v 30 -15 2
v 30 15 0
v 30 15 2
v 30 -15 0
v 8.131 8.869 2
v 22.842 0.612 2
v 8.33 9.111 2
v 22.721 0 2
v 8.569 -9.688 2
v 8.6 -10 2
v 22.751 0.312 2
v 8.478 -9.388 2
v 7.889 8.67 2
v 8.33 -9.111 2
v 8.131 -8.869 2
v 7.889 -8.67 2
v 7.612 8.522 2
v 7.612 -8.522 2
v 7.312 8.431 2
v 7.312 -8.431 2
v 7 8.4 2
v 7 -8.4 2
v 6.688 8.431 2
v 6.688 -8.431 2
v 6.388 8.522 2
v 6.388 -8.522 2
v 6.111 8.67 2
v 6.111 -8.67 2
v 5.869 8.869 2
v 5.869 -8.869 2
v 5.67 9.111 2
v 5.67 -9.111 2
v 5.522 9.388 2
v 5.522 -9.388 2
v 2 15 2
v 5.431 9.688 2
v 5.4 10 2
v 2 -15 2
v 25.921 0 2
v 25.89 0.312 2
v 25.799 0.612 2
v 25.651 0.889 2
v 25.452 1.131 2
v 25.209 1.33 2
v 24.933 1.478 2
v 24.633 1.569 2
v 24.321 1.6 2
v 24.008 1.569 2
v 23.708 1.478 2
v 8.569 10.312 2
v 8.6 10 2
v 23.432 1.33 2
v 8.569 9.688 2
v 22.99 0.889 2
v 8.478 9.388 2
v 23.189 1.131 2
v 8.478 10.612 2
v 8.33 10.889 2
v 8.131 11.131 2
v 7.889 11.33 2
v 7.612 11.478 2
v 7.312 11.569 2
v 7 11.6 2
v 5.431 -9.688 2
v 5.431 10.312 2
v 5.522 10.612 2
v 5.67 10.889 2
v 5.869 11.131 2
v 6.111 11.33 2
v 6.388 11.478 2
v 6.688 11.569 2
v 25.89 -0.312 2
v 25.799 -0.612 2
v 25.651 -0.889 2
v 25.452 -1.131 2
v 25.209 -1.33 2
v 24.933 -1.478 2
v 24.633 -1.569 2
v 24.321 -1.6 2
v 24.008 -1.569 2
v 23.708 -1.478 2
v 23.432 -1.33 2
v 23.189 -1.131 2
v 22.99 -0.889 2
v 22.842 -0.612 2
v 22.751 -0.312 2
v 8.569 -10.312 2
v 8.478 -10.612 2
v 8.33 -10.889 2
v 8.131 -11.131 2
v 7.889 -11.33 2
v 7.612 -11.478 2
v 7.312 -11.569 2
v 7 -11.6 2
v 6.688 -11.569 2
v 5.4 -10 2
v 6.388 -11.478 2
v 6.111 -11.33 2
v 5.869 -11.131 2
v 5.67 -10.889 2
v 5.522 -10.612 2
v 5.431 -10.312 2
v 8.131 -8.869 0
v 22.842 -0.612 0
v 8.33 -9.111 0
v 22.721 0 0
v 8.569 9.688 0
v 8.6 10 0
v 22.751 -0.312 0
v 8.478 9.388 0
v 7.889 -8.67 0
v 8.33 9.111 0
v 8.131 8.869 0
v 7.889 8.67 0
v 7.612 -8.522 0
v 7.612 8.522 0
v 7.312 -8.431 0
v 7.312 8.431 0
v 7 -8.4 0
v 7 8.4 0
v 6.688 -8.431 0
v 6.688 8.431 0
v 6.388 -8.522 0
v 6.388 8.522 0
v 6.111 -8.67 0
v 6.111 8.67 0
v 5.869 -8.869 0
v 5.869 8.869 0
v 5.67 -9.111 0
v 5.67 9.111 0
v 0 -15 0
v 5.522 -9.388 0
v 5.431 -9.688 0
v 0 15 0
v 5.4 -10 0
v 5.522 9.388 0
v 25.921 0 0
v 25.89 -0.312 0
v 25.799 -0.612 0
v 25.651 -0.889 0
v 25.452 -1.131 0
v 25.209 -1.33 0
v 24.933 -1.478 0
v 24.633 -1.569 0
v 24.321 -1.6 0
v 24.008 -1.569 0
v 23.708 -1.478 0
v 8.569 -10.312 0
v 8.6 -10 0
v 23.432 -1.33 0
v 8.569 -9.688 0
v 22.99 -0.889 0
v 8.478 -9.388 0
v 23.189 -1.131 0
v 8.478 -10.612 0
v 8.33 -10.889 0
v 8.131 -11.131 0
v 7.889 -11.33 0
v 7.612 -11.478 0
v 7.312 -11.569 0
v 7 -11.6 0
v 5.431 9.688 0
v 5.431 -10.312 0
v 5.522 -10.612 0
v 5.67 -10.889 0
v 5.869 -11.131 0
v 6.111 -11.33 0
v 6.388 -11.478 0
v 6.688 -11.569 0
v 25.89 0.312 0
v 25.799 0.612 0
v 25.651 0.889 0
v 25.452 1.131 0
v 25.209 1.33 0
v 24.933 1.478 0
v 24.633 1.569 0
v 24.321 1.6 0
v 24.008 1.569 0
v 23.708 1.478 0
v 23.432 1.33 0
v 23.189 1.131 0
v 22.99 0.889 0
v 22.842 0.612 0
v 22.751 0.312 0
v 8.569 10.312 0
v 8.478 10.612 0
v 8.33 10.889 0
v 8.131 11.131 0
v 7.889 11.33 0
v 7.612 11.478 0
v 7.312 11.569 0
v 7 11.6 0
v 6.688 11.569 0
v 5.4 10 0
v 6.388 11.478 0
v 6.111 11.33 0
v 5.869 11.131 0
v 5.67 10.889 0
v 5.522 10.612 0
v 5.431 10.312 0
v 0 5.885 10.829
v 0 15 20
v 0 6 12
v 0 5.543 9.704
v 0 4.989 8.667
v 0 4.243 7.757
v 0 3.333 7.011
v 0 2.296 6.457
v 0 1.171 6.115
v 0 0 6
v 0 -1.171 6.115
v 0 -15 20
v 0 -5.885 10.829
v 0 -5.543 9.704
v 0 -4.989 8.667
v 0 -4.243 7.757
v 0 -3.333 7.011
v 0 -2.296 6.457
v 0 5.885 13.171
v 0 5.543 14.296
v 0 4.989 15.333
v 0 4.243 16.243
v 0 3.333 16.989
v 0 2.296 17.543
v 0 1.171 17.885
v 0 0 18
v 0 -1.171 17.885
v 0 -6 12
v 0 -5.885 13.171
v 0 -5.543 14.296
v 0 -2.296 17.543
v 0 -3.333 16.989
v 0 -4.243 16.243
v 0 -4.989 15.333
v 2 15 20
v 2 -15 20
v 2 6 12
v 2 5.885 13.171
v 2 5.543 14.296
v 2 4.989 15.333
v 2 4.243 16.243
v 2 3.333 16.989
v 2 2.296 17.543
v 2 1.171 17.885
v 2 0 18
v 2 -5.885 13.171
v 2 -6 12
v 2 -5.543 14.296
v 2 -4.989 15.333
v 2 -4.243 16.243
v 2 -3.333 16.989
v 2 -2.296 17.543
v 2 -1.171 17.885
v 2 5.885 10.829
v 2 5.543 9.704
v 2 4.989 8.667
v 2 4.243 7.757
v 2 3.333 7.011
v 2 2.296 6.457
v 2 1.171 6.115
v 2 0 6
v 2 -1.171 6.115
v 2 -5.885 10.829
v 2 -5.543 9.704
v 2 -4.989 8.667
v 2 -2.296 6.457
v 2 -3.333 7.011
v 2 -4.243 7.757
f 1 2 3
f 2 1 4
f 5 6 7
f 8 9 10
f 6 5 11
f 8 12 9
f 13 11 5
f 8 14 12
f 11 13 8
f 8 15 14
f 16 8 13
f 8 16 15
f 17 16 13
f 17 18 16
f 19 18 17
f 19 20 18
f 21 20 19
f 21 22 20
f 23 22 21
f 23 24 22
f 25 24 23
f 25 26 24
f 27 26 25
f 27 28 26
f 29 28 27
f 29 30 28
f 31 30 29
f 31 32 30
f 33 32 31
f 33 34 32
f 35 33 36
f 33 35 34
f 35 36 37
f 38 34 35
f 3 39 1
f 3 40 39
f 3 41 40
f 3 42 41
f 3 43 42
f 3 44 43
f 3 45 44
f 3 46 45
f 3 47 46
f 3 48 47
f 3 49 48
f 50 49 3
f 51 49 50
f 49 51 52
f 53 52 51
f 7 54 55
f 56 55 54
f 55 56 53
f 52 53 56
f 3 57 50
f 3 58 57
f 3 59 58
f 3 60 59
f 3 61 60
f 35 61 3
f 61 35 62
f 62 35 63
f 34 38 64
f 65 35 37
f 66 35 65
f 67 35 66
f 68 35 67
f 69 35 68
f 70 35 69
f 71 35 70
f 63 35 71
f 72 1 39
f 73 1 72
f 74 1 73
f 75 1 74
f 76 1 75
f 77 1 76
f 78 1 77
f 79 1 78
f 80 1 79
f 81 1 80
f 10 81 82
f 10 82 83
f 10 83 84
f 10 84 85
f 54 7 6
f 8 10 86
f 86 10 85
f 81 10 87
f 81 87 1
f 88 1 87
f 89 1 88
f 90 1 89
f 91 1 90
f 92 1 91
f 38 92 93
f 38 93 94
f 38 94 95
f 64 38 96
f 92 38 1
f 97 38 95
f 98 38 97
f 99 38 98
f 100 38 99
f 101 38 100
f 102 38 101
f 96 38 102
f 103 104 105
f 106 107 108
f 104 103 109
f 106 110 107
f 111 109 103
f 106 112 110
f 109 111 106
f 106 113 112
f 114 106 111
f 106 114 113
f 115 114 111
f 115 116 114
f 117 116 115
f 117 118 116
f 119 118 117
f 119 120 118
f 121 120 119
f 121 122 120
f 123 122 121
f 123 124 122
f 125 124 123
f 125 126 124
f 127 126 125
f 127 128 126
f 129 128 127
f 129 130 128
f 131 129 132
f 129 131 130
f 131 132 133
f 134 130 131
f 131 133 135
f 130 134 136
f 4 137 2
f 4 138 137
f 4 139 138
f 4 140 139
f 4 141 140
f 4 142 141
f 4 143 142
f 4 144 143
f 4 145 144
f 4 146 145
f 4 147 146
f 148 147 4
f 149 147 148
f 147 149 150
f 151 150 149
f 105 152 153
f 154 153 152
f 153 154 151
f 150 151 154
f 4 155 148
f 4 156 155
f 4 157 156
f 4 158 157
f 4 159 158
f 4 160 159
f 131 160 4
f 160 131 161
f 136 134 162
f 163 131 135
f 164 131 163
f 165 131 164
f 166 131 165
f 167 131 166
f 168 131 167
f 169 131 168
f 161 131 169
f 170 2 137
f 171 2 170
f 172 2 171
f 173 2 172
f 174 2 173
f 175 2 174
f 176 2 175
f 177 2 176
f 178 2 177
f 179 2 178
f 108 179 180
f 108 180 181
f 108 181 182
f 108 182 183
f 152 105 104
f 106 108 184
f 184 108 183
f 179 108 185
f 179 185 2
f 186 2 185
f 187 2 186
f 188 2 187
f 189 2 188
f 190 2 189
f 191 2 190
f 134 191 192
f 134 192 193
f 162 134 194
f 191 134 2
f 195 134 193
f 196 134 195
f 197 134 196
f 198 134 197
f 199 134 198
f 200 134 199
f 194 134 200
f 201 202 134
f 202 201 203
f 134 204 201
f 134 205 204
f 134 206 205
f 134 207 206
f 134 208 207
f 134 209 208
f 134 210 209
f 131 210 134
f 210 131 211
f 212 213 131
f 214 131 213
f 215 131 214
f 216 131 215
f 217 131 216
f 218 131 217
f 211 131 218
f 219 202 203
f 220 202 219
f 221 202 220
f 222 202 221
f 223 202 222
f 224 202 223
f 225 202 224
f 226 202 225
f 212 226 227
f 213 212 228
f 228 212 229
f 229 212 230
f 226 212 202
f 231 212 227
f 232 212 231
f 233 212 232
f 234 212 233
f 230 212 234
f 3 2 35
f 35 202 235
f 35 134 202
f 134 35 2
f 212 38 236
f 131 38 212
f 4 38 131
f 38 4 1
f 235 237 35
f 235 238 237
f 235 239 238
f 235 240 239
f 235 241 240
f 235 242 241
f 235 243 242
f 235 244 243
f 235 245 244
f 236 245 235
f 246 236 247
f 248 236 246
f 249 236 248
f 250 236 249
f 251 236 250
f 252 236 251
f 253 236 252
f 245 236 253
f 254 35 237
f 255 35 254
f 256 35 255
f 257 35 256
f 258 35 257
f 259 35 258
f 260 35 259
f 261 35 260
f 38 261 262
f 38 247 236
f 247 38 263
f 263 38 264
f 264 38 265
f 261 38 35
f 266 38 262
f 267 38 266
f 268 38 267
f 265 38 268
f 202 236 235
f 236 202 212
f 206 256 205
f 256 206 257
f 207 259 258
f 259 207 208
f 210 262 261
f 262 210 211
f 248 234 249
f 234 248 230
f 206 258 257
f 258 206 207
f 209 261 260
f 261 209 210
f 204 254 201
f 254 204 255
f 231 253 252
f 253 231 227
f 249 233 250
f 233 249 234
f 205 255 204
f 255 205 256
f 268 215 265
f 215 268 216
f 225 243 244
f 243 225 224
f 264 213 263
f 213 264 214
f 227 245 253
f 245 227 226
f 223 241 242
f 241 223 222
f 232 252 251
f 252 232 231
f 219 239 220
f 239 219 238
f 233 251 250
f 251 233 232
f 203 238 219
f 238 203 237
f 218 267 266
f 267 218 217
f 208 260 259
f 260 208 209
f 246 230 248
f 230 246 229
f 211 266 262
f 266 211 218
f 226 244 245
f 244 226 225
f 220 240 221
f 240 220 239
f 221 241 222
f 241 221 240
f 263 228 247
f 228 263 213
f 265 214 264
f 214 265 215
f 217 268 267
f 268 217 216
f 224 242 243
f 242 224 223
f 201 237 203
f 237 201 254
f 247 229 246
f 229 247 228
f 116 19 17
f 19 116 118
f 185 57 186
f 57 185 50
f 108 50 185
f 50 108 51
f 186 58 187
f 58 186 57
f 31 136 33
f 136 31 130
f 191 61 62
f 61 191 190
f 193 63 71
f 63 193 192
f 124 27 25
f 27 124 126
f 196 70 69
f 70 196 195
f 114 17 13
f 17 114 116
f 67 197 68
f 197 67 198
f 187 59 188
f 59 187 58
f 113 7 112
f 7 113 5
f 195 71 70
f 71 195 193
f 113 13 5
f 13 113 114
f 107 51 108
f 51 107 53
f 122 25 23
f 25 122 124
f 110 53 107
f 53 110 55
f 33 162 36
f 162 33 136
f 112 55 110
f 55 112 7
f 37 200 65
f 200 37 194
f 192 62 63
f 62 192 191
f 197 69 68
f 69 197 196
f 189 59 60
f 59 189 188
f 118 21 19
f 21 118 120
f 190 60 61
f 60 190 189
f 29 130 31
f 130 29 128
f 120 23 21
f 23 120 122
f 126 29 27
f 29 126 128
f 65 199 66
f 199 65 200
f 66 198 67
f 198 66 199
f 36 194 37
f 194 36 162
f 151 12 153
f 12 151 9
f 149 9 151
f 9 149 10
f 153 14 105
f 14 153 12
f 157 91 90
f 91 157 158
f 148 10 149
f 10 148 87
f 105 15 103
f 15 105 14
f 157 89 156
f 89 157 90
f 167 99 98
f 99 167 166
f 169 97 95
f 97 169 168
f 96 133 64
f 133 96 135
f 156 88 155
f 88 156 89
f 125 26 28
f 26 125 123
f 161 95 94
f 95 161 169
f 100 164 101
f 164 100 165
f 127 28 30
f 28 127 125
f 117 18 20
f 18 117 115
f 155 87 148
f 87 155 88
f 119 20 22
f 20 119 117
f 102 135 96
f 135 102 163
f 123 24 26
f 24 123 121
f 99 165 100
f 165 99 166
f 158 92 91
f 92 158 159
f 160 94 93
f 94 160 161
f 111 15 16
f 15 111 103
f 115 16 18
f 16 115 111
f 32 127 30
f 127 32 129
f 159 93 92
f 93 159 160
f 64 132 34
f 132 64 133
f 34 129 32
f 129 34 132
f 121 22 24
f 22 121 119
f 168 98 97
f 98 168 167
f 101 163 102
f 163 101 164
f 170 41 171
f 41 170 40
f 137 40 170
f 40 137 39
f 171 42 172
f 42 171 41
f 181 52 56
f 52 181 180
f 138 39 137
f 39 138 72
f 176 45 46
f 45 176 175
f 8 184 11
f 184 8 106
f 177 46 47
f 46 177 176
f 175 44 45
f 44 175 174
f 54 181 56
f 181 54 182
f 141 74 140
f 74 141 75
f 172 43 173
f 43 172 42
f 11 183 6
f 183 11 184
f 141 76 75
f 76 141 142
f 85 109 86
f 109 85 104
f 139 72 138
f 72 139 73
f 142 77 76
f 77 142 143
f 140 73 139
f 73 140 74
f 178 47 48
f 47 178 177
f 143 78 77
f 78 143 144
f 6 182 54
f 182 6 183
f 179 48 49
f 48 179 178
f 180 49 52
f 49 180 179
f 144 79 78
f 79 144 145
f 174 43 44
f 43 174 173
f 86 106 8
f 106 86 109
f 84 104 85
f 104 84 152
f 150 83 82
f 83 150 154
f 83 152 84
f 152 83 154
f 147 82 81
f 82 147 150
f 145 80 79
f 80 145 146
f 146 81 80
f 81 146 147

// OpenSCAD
// use <atu_rounds.scad>

$fn=32;
ov    = 0.05;
ov2   = 2*ov;
w     = 2.0;

x_1   = 30.0;
y_1   = 30.0;
z_1   = 20.00;
d_1   = 12.0;

d_h   = 3.20;

difference() {
  union() {
    //translate([0,-y_1/2,0]) cube_round_xy( x_1, y_1, w, rr = 1.2 );
    translate([0,-y_1/2,0]) cube( [x_1, y_1, w] );
    translate([0,-y_1/2,0]) cube( [w,  y_1, z_1] );
  }
  translate([-ov,0,z_1/2+2]) rotate([0,90,0]) cylinder( d=d_1, h=2*w+2*ov );
  translate([5+w, 10,-ov]) cylinder( d=d_h, h=2*w+2*ov );
  translate([5+w,-10,-ov]) cylinder( d=d_h, h=2*w+2*ov );
  translate([5+w+10*sqrt(3),  0,-ov]) cylinder( d=d_h, h=2*w+2*ov );
  
}


  
  
